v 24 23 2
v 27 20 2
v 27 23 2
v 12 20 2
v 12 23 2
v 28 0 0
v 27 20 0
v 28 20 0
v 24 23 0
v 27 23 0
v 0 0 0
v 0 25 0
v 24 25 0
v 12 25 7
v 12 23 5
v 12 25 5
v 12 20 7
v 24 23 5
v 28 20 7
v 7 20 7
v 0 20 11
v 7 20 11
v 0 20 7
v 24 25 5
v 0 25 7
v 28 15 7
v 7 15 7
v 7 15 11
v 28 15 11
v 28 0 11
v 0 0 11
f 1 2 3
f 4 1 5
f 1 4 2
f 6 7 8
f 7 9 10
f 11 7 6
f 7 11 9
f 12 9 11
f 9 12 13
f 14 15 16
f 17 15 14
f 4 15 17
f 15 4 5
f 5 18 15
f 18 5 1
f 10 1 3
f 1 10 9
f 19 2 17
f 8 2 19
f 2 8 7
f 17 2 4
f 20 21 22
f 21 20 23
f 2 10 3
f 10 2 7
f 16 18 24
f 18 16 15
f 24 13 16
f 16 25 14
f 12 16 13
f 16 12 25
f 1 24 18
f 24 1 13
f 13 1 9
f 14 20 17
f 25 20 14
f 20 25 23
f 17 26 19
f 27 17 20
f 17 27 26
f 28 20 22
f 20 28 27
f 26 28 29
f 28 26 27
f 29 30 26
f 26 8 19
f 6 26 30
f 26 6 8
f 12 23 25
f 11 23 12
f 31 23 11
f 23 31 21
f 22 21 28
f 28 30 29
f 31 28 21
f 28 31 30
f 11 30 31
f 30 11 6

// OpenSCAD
translate([14.5, 21.5, 1.0]) color([0.9595322940755414, 0.3403879026852894, 0.5233486454380116]) cube([5, 3, 2], center=true);
translate([19.5, 21.5, 1.0]) color([0.35536744790103547, 0.6315169232882821, 0.08649939658707362]) cube([5, 3, 2], center=true);
translate([24.5, 21.5, 1.0]) color([0.7550350740823142, 0.2947283238309857, 0.8301737658604361]) cube([5, 3, 2], center=true);
translate([13.5, 24.0, 2.5]) color([0.4490883769000732, 0.4620108455998946, 0.2187341846418389]) cube([3, 2, 5], center=true);
translate([16.5, 24.0, 2.5]) color([0.11445722556586746, 0.9788025142917065, 0.3011589686960586]) cube([3, 2, 5], center=true);
translate([19.5, 24.0, 2.5]) color([0.6091605287508749, 0.4242090709976407, 0.7513524999576429]) cube([3, 2, 5], center=true);
translate([22.5, 24.0, 2.5]) color([0.09255304692818778, 0.4976795968420046, 0.9609180855182016]) cube([3, 2, 5], center=true);
translate([8.5, 17.5, 3.5]) color([0.5437408220916614, 0.405305104554358, 0.6320656015278037]) cube([3, 5, 7], center=true);
translate([11.5, 17.5, 3.5]) color([0.0216193804206819, 0.2700784048715086, 0.6684886667173141]) cube([3, 5, 7], center=true);
translate([14.5, 17.5, 3.5]) color([0.0002532098932251925, 0.3984286079265319, 0.8905618085087551]) cube([3, 5, 7], center=true);
translate([17.5, 17.5, 3.5]) color([0.7099647178965433, 0.4445845492335537, 0.7465509493098265]) cube([3, 5, 7], center=true);
translate([20.5, 17.5, 3.5]) color([0.35382203223851694, 0.8712980207444939, 0.6725473918674463]) cube([3, 5, 7], center=true);
translate([23.5, 17.5, 3.5]) color([0.19603088941730495, 0.08525923665948931, 0.0704556688087915]) cube([3, 5, 7], center=true);
translate([26.5, 17.5, 3.5]) color([0.26248678792717994, 0.533638651221174, 0.11818482376773232]) cube([3, 5, 7], center=true);
translate([1.5, 22.5, 3.5]) color([0.8594532404023933, 0.8906989166138923, 0.7620005545284954]) cube([3, 5, 7], center=true);
translate([4.5, 22.5, 3.5]) color([0.06809296768032302, 0.8609410769469436, 0.2827478909480132]) cube([3, 5, 7], center=true);
translate([7.5, 22.5, 3.5]) color([0.13442052583382869, 0.5230599837537087, 0.21027834364306774]) cube([3, 5, 7], center=true);
translate([10.5, 22.5, 3.5]) color([0.10530639745894443, 0.9556548717215211, 0.5435731515542631]) cube([3, 5, 7], center=true);
translate([3.5, 2.5, 5.5]) color([0.7414270622920264, 0.9040457292510377, 0.2786145977098805]) cube([7, 5, 11], center=true);
translate([10.5, 2.5, 5.5]) color([0.4423646135017597, 0.5682329433322765, 0.13781274972163116]) cube([7, 5, 11], center=true);
translate([17.5, 2.5, 5.5]) color([0.1232982180791492, 0.12051785276403837, 0.4012165411640888]) cube([7, 5, 11], center=true);
translate([24.5, 2.5, 5.5]) color([0.4679428423906348, 0.5596131508667647, 0.29896126951320356]) cube([7, 5, 11], center=true);
translate([3.5, 7.5, 5.5]) color([0.6321114709426877, 0.7423454703026071, 0.21800995973285464]) cube([7, 5, 11], center=true);
translate([10.5, 7.5, 5.5]) color([0.48885816108208613, 0.501567157493831, 0.49271975198428686]) cube([7, 5, 11], center=true);
translate([17.5, 7.5, 5.5]) color([0.958422556968198, 0.44398175403613704, 0.14281143058247625]) cube([7, 5, 11], center=true);
translate([24.5, 7.5, 5.5]) color([0.4955231327742775, 0.8873352305676206, 0.21571394075115613]) cube([7, 5, 11], center=true);
translate([3.5, 12.5, 5.5]) color([0.3554013630116646, 0.39096604949642, 0.9928835035123682]) cube([7, 5, 11], center=true);
translate([10.5, 12.5, 5.5]) color([0.8462248334797323, 0.9789066021625461, 0.6868956228130294]) cube([7, 5, 11], center=true);
translate([17.5, 12.5, 5.5]) color([0.08137290691060206, 0.9493092651810784, 0.9246190463677613]) cube([7, 5, 11], center=true);
translate([24.5, 12.5, 5.5]) color([0.3951154575230438, 0.3612783181755085, 0.11615210489091876]) cube([7, 5, 11], center=true);
translate([3.5, 17.5, 5.5]) color([0.0037403702712440756, 0.2703277384724262, 0.6403732426441148]) cube([7, 5, 11], center=true);
